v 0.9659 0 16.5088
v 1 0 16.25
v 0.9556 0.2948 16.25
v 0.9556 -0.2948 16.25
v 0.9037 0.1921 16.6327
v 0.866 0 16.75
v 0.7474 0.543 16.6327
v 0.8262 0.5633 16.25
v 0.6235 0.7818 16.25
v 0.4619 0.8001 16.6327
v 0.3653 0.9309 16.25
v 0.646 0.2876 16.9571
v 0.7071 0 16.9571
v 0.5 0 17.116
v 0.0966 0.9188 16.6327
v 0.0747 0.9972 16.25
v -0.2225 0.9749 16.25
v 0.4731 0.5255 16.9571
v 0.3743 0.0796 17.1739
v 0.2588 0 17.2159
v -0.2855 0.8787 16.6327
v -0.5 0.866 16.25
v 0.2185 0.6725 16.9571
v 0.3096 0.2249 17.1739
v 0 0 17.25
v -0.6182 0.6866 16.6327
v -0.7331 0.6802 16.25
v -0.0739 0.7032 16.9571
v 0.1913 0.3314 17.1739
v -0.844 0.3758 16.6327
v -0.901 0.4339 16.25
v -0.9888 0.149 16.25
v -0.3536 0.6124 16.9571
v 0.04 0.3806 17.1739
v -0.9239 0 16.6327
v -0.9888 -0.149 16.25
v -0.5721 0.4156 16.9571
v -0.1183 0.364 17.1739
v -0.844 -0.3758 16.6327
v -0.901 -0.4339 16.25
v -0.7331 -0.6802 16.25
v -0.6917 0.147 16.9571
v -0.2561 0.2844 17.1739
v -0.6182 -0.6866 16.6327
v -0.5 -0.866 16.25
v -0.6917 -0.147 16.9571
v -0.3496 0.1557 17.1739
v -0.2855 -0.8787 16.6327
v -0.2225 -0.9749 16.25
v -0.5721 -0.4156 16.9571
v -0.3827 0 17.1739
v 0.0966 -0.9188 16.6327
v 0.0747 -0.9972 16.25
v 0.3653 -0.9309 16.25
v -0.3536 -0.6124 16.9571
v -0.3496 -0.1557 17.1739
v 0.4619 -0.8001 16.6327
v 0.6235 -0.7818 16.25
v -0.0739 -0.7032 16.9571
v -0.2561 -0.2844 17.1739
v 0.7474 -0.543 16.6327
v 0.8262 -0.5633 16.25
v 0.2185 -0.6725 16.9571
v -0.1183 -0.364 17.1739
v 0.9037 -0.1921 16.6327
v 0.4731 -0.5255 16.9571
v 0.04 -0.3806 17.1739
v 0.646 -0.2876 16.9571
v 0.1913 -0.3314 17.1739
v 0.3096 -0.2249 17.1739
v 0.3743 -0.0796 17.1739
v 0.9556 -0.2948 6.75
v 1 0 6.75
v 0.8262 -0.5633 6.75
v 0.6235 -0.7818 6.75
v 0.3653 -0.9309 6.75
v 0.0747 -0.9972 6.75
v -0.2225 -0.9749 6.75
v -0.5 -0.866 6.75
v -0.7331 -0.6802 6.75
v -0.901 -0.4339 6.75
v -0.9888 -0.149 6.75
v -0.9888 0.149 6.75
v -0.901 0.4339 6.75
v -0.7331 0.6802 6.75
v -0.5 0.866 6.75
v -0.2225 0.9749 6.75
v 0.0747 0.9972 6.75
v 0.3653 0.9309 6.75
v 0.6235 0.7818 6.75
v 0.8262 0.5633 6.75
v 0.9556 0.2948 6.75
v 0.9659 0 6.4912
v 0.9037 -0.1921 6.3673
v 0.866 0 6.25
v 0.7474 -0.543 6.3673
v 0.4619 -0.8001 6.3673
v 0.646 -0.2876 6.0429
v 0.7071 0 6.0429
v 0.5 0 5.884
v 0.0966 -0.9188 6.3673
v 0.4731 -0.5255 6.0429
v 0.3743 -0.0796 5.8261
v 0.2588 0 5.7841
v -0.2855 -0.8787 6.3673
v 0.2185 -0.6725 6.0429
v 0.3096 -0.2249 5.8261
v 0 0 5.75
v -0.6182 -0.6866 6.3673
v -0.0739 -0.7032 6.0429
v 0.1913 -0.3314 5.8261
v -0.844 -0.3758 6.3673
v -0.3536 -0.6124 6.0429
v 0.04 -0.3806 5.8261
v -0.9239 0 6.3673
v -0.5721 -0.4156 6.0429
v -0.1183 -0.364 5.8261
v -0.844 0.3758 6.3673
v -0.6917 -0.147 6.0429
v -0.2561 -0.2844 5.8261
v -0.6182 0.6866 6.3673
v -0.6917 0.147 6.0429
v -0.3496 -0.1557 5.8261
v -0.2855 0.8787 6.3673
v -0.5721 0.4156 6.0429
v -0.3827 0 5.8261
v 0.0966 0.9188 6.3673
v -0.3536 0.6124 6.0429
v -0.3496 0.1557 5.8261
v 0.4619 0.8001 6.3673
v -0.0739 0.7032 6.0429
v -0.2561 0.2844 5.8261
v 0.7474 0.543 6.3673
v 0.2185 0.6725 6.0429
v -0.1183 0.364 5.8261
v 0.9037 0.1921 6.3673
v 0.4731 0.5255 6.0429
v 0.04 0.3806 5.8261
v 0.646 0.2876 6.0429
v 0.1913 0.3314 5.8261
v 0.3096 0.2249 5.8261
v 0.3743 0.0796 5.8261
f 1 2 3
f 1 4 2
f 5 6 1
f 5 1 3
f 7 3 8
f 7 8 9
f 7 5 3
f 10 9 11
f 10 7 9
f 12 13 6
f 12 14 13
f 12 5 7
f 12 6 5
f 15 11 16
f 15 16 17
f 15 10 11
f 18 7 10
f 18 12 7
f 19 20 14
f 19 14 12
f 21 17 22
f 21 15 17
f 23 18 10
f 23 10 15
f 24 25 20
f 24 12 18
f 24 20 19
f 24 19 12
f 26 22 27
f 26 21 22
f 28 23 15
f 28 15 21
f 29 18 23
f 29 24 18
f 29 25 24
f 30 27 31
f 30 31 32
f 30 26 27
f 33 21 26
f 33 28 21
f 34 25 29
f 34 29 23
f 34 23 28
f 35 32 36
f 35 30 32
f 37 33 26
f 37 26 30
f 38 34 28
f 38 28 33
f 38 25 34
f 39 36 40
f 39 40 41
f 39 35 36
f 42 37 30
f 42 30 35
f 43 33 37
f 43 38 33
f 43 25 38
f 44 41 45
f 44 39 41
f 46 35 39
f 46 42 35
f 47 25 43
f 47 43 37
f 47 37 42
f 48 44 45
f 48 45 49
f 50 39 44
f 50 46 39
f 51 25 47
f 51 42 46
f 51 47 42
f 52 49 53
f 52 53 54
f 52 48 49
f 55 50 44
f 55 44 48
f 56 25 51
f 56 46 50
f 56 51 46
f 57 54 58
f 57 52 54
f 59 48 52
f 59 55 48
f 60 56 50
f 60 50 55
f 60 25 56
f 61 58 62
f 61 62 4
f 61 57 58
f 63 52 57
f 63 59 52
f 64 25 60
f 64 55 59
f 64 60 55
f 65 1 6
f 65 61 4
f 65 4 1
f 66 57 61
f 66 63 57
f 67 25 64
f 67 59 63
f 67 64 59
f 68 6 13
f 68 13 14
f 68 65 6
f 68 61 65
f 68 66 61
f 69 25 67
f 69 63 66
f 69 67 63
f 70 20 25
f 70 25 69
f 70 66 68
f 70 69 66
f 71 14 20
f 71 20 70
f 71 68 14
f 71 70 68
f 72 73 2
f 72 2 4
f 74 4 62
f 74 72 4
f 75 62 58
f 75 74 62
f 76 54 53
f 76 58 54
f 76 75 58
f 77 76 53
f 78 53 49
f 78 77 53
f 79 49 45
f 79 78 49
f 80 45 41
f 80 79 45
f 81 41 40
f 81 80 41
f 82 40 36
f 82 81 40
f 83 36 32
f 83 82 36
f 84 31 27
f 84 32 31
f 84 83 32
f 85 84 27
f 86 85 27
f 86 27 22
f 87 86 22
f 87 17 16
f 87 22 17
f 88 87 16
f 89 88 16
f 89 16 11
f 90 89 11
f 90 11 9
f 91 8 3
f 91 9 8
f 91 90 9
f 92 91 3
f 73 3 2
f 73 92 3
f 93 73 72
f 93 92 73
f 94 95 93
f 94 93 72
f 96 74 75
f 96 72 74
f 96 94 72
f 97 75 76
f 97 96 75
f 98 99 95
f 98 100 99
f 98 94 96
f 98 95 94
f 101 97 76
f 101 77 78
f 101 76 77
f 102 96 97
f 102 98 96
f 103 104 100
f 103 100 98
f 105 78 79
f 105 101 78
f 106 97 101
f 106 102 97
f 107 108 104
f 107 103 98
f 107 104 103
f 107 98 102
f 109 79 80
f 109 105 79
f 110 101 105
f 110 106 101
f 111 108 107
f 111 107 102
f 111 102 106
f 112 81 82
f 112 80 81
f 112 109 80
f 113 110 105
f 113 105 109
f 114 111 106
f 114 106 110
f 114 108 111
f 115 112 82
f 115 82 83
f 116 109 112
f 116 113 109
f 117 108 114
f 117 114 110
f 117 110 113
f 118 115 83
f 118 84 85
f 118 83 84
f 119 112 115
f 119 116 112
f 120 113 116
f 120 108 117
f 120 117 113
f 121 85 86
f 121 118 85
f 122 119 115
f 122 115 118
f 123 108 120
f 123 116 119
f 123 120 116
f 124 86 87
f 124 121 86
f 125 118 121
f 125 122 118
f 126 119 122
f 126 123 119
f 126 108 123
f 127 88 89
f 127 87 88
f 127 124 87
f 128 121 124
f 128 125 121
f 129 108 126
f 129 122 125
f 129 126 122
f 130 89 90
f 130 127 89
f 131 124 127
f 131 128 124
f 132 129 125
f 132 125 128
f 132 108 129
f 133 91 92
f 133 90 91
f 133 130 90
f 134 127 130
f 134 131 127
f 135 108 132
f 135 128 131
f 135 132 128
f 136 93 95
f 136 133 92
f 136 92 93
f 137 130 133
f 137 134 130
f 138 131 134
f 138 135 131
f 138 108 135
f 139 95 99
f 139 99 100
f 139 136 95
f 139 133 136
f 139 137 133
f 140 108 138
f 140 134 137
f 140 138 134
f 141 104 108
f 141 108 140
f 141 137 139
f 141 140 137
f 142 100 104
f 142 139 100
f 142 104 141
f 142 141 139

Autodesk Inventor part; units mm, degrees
ref_plane "YZ Plane" through (0, 0, 0) normal (1, 0, 0) x (0, 1, 0)
ref_plane "XZ Plane" through (0, 0, 0) normal (0, 1, 0) x (-1, 0, 0)
ref_plane "XY Plane" through (0, 0, 0) normal (0, 0, 1) x (1, 0, 0)
sketch "Sketch1" plane through (0, 0, 0) normal (0, 0, 1) x (1, 0, 0)
  circle A0 centre (0, 0) radius 2
  dimension "d0" = 4
extrude "Extrusion1" add sketch "Sketch1" along normal blind 23
fillet "Fillet1" radius 2 2 edges at (-2, 0, 23) (-2, 0, 0)
scale "Scale1" factors (0.5, 0.5, 0.5) then translate (0, 0, 5.75) bodies 1
properties part number "Pasador 2"
